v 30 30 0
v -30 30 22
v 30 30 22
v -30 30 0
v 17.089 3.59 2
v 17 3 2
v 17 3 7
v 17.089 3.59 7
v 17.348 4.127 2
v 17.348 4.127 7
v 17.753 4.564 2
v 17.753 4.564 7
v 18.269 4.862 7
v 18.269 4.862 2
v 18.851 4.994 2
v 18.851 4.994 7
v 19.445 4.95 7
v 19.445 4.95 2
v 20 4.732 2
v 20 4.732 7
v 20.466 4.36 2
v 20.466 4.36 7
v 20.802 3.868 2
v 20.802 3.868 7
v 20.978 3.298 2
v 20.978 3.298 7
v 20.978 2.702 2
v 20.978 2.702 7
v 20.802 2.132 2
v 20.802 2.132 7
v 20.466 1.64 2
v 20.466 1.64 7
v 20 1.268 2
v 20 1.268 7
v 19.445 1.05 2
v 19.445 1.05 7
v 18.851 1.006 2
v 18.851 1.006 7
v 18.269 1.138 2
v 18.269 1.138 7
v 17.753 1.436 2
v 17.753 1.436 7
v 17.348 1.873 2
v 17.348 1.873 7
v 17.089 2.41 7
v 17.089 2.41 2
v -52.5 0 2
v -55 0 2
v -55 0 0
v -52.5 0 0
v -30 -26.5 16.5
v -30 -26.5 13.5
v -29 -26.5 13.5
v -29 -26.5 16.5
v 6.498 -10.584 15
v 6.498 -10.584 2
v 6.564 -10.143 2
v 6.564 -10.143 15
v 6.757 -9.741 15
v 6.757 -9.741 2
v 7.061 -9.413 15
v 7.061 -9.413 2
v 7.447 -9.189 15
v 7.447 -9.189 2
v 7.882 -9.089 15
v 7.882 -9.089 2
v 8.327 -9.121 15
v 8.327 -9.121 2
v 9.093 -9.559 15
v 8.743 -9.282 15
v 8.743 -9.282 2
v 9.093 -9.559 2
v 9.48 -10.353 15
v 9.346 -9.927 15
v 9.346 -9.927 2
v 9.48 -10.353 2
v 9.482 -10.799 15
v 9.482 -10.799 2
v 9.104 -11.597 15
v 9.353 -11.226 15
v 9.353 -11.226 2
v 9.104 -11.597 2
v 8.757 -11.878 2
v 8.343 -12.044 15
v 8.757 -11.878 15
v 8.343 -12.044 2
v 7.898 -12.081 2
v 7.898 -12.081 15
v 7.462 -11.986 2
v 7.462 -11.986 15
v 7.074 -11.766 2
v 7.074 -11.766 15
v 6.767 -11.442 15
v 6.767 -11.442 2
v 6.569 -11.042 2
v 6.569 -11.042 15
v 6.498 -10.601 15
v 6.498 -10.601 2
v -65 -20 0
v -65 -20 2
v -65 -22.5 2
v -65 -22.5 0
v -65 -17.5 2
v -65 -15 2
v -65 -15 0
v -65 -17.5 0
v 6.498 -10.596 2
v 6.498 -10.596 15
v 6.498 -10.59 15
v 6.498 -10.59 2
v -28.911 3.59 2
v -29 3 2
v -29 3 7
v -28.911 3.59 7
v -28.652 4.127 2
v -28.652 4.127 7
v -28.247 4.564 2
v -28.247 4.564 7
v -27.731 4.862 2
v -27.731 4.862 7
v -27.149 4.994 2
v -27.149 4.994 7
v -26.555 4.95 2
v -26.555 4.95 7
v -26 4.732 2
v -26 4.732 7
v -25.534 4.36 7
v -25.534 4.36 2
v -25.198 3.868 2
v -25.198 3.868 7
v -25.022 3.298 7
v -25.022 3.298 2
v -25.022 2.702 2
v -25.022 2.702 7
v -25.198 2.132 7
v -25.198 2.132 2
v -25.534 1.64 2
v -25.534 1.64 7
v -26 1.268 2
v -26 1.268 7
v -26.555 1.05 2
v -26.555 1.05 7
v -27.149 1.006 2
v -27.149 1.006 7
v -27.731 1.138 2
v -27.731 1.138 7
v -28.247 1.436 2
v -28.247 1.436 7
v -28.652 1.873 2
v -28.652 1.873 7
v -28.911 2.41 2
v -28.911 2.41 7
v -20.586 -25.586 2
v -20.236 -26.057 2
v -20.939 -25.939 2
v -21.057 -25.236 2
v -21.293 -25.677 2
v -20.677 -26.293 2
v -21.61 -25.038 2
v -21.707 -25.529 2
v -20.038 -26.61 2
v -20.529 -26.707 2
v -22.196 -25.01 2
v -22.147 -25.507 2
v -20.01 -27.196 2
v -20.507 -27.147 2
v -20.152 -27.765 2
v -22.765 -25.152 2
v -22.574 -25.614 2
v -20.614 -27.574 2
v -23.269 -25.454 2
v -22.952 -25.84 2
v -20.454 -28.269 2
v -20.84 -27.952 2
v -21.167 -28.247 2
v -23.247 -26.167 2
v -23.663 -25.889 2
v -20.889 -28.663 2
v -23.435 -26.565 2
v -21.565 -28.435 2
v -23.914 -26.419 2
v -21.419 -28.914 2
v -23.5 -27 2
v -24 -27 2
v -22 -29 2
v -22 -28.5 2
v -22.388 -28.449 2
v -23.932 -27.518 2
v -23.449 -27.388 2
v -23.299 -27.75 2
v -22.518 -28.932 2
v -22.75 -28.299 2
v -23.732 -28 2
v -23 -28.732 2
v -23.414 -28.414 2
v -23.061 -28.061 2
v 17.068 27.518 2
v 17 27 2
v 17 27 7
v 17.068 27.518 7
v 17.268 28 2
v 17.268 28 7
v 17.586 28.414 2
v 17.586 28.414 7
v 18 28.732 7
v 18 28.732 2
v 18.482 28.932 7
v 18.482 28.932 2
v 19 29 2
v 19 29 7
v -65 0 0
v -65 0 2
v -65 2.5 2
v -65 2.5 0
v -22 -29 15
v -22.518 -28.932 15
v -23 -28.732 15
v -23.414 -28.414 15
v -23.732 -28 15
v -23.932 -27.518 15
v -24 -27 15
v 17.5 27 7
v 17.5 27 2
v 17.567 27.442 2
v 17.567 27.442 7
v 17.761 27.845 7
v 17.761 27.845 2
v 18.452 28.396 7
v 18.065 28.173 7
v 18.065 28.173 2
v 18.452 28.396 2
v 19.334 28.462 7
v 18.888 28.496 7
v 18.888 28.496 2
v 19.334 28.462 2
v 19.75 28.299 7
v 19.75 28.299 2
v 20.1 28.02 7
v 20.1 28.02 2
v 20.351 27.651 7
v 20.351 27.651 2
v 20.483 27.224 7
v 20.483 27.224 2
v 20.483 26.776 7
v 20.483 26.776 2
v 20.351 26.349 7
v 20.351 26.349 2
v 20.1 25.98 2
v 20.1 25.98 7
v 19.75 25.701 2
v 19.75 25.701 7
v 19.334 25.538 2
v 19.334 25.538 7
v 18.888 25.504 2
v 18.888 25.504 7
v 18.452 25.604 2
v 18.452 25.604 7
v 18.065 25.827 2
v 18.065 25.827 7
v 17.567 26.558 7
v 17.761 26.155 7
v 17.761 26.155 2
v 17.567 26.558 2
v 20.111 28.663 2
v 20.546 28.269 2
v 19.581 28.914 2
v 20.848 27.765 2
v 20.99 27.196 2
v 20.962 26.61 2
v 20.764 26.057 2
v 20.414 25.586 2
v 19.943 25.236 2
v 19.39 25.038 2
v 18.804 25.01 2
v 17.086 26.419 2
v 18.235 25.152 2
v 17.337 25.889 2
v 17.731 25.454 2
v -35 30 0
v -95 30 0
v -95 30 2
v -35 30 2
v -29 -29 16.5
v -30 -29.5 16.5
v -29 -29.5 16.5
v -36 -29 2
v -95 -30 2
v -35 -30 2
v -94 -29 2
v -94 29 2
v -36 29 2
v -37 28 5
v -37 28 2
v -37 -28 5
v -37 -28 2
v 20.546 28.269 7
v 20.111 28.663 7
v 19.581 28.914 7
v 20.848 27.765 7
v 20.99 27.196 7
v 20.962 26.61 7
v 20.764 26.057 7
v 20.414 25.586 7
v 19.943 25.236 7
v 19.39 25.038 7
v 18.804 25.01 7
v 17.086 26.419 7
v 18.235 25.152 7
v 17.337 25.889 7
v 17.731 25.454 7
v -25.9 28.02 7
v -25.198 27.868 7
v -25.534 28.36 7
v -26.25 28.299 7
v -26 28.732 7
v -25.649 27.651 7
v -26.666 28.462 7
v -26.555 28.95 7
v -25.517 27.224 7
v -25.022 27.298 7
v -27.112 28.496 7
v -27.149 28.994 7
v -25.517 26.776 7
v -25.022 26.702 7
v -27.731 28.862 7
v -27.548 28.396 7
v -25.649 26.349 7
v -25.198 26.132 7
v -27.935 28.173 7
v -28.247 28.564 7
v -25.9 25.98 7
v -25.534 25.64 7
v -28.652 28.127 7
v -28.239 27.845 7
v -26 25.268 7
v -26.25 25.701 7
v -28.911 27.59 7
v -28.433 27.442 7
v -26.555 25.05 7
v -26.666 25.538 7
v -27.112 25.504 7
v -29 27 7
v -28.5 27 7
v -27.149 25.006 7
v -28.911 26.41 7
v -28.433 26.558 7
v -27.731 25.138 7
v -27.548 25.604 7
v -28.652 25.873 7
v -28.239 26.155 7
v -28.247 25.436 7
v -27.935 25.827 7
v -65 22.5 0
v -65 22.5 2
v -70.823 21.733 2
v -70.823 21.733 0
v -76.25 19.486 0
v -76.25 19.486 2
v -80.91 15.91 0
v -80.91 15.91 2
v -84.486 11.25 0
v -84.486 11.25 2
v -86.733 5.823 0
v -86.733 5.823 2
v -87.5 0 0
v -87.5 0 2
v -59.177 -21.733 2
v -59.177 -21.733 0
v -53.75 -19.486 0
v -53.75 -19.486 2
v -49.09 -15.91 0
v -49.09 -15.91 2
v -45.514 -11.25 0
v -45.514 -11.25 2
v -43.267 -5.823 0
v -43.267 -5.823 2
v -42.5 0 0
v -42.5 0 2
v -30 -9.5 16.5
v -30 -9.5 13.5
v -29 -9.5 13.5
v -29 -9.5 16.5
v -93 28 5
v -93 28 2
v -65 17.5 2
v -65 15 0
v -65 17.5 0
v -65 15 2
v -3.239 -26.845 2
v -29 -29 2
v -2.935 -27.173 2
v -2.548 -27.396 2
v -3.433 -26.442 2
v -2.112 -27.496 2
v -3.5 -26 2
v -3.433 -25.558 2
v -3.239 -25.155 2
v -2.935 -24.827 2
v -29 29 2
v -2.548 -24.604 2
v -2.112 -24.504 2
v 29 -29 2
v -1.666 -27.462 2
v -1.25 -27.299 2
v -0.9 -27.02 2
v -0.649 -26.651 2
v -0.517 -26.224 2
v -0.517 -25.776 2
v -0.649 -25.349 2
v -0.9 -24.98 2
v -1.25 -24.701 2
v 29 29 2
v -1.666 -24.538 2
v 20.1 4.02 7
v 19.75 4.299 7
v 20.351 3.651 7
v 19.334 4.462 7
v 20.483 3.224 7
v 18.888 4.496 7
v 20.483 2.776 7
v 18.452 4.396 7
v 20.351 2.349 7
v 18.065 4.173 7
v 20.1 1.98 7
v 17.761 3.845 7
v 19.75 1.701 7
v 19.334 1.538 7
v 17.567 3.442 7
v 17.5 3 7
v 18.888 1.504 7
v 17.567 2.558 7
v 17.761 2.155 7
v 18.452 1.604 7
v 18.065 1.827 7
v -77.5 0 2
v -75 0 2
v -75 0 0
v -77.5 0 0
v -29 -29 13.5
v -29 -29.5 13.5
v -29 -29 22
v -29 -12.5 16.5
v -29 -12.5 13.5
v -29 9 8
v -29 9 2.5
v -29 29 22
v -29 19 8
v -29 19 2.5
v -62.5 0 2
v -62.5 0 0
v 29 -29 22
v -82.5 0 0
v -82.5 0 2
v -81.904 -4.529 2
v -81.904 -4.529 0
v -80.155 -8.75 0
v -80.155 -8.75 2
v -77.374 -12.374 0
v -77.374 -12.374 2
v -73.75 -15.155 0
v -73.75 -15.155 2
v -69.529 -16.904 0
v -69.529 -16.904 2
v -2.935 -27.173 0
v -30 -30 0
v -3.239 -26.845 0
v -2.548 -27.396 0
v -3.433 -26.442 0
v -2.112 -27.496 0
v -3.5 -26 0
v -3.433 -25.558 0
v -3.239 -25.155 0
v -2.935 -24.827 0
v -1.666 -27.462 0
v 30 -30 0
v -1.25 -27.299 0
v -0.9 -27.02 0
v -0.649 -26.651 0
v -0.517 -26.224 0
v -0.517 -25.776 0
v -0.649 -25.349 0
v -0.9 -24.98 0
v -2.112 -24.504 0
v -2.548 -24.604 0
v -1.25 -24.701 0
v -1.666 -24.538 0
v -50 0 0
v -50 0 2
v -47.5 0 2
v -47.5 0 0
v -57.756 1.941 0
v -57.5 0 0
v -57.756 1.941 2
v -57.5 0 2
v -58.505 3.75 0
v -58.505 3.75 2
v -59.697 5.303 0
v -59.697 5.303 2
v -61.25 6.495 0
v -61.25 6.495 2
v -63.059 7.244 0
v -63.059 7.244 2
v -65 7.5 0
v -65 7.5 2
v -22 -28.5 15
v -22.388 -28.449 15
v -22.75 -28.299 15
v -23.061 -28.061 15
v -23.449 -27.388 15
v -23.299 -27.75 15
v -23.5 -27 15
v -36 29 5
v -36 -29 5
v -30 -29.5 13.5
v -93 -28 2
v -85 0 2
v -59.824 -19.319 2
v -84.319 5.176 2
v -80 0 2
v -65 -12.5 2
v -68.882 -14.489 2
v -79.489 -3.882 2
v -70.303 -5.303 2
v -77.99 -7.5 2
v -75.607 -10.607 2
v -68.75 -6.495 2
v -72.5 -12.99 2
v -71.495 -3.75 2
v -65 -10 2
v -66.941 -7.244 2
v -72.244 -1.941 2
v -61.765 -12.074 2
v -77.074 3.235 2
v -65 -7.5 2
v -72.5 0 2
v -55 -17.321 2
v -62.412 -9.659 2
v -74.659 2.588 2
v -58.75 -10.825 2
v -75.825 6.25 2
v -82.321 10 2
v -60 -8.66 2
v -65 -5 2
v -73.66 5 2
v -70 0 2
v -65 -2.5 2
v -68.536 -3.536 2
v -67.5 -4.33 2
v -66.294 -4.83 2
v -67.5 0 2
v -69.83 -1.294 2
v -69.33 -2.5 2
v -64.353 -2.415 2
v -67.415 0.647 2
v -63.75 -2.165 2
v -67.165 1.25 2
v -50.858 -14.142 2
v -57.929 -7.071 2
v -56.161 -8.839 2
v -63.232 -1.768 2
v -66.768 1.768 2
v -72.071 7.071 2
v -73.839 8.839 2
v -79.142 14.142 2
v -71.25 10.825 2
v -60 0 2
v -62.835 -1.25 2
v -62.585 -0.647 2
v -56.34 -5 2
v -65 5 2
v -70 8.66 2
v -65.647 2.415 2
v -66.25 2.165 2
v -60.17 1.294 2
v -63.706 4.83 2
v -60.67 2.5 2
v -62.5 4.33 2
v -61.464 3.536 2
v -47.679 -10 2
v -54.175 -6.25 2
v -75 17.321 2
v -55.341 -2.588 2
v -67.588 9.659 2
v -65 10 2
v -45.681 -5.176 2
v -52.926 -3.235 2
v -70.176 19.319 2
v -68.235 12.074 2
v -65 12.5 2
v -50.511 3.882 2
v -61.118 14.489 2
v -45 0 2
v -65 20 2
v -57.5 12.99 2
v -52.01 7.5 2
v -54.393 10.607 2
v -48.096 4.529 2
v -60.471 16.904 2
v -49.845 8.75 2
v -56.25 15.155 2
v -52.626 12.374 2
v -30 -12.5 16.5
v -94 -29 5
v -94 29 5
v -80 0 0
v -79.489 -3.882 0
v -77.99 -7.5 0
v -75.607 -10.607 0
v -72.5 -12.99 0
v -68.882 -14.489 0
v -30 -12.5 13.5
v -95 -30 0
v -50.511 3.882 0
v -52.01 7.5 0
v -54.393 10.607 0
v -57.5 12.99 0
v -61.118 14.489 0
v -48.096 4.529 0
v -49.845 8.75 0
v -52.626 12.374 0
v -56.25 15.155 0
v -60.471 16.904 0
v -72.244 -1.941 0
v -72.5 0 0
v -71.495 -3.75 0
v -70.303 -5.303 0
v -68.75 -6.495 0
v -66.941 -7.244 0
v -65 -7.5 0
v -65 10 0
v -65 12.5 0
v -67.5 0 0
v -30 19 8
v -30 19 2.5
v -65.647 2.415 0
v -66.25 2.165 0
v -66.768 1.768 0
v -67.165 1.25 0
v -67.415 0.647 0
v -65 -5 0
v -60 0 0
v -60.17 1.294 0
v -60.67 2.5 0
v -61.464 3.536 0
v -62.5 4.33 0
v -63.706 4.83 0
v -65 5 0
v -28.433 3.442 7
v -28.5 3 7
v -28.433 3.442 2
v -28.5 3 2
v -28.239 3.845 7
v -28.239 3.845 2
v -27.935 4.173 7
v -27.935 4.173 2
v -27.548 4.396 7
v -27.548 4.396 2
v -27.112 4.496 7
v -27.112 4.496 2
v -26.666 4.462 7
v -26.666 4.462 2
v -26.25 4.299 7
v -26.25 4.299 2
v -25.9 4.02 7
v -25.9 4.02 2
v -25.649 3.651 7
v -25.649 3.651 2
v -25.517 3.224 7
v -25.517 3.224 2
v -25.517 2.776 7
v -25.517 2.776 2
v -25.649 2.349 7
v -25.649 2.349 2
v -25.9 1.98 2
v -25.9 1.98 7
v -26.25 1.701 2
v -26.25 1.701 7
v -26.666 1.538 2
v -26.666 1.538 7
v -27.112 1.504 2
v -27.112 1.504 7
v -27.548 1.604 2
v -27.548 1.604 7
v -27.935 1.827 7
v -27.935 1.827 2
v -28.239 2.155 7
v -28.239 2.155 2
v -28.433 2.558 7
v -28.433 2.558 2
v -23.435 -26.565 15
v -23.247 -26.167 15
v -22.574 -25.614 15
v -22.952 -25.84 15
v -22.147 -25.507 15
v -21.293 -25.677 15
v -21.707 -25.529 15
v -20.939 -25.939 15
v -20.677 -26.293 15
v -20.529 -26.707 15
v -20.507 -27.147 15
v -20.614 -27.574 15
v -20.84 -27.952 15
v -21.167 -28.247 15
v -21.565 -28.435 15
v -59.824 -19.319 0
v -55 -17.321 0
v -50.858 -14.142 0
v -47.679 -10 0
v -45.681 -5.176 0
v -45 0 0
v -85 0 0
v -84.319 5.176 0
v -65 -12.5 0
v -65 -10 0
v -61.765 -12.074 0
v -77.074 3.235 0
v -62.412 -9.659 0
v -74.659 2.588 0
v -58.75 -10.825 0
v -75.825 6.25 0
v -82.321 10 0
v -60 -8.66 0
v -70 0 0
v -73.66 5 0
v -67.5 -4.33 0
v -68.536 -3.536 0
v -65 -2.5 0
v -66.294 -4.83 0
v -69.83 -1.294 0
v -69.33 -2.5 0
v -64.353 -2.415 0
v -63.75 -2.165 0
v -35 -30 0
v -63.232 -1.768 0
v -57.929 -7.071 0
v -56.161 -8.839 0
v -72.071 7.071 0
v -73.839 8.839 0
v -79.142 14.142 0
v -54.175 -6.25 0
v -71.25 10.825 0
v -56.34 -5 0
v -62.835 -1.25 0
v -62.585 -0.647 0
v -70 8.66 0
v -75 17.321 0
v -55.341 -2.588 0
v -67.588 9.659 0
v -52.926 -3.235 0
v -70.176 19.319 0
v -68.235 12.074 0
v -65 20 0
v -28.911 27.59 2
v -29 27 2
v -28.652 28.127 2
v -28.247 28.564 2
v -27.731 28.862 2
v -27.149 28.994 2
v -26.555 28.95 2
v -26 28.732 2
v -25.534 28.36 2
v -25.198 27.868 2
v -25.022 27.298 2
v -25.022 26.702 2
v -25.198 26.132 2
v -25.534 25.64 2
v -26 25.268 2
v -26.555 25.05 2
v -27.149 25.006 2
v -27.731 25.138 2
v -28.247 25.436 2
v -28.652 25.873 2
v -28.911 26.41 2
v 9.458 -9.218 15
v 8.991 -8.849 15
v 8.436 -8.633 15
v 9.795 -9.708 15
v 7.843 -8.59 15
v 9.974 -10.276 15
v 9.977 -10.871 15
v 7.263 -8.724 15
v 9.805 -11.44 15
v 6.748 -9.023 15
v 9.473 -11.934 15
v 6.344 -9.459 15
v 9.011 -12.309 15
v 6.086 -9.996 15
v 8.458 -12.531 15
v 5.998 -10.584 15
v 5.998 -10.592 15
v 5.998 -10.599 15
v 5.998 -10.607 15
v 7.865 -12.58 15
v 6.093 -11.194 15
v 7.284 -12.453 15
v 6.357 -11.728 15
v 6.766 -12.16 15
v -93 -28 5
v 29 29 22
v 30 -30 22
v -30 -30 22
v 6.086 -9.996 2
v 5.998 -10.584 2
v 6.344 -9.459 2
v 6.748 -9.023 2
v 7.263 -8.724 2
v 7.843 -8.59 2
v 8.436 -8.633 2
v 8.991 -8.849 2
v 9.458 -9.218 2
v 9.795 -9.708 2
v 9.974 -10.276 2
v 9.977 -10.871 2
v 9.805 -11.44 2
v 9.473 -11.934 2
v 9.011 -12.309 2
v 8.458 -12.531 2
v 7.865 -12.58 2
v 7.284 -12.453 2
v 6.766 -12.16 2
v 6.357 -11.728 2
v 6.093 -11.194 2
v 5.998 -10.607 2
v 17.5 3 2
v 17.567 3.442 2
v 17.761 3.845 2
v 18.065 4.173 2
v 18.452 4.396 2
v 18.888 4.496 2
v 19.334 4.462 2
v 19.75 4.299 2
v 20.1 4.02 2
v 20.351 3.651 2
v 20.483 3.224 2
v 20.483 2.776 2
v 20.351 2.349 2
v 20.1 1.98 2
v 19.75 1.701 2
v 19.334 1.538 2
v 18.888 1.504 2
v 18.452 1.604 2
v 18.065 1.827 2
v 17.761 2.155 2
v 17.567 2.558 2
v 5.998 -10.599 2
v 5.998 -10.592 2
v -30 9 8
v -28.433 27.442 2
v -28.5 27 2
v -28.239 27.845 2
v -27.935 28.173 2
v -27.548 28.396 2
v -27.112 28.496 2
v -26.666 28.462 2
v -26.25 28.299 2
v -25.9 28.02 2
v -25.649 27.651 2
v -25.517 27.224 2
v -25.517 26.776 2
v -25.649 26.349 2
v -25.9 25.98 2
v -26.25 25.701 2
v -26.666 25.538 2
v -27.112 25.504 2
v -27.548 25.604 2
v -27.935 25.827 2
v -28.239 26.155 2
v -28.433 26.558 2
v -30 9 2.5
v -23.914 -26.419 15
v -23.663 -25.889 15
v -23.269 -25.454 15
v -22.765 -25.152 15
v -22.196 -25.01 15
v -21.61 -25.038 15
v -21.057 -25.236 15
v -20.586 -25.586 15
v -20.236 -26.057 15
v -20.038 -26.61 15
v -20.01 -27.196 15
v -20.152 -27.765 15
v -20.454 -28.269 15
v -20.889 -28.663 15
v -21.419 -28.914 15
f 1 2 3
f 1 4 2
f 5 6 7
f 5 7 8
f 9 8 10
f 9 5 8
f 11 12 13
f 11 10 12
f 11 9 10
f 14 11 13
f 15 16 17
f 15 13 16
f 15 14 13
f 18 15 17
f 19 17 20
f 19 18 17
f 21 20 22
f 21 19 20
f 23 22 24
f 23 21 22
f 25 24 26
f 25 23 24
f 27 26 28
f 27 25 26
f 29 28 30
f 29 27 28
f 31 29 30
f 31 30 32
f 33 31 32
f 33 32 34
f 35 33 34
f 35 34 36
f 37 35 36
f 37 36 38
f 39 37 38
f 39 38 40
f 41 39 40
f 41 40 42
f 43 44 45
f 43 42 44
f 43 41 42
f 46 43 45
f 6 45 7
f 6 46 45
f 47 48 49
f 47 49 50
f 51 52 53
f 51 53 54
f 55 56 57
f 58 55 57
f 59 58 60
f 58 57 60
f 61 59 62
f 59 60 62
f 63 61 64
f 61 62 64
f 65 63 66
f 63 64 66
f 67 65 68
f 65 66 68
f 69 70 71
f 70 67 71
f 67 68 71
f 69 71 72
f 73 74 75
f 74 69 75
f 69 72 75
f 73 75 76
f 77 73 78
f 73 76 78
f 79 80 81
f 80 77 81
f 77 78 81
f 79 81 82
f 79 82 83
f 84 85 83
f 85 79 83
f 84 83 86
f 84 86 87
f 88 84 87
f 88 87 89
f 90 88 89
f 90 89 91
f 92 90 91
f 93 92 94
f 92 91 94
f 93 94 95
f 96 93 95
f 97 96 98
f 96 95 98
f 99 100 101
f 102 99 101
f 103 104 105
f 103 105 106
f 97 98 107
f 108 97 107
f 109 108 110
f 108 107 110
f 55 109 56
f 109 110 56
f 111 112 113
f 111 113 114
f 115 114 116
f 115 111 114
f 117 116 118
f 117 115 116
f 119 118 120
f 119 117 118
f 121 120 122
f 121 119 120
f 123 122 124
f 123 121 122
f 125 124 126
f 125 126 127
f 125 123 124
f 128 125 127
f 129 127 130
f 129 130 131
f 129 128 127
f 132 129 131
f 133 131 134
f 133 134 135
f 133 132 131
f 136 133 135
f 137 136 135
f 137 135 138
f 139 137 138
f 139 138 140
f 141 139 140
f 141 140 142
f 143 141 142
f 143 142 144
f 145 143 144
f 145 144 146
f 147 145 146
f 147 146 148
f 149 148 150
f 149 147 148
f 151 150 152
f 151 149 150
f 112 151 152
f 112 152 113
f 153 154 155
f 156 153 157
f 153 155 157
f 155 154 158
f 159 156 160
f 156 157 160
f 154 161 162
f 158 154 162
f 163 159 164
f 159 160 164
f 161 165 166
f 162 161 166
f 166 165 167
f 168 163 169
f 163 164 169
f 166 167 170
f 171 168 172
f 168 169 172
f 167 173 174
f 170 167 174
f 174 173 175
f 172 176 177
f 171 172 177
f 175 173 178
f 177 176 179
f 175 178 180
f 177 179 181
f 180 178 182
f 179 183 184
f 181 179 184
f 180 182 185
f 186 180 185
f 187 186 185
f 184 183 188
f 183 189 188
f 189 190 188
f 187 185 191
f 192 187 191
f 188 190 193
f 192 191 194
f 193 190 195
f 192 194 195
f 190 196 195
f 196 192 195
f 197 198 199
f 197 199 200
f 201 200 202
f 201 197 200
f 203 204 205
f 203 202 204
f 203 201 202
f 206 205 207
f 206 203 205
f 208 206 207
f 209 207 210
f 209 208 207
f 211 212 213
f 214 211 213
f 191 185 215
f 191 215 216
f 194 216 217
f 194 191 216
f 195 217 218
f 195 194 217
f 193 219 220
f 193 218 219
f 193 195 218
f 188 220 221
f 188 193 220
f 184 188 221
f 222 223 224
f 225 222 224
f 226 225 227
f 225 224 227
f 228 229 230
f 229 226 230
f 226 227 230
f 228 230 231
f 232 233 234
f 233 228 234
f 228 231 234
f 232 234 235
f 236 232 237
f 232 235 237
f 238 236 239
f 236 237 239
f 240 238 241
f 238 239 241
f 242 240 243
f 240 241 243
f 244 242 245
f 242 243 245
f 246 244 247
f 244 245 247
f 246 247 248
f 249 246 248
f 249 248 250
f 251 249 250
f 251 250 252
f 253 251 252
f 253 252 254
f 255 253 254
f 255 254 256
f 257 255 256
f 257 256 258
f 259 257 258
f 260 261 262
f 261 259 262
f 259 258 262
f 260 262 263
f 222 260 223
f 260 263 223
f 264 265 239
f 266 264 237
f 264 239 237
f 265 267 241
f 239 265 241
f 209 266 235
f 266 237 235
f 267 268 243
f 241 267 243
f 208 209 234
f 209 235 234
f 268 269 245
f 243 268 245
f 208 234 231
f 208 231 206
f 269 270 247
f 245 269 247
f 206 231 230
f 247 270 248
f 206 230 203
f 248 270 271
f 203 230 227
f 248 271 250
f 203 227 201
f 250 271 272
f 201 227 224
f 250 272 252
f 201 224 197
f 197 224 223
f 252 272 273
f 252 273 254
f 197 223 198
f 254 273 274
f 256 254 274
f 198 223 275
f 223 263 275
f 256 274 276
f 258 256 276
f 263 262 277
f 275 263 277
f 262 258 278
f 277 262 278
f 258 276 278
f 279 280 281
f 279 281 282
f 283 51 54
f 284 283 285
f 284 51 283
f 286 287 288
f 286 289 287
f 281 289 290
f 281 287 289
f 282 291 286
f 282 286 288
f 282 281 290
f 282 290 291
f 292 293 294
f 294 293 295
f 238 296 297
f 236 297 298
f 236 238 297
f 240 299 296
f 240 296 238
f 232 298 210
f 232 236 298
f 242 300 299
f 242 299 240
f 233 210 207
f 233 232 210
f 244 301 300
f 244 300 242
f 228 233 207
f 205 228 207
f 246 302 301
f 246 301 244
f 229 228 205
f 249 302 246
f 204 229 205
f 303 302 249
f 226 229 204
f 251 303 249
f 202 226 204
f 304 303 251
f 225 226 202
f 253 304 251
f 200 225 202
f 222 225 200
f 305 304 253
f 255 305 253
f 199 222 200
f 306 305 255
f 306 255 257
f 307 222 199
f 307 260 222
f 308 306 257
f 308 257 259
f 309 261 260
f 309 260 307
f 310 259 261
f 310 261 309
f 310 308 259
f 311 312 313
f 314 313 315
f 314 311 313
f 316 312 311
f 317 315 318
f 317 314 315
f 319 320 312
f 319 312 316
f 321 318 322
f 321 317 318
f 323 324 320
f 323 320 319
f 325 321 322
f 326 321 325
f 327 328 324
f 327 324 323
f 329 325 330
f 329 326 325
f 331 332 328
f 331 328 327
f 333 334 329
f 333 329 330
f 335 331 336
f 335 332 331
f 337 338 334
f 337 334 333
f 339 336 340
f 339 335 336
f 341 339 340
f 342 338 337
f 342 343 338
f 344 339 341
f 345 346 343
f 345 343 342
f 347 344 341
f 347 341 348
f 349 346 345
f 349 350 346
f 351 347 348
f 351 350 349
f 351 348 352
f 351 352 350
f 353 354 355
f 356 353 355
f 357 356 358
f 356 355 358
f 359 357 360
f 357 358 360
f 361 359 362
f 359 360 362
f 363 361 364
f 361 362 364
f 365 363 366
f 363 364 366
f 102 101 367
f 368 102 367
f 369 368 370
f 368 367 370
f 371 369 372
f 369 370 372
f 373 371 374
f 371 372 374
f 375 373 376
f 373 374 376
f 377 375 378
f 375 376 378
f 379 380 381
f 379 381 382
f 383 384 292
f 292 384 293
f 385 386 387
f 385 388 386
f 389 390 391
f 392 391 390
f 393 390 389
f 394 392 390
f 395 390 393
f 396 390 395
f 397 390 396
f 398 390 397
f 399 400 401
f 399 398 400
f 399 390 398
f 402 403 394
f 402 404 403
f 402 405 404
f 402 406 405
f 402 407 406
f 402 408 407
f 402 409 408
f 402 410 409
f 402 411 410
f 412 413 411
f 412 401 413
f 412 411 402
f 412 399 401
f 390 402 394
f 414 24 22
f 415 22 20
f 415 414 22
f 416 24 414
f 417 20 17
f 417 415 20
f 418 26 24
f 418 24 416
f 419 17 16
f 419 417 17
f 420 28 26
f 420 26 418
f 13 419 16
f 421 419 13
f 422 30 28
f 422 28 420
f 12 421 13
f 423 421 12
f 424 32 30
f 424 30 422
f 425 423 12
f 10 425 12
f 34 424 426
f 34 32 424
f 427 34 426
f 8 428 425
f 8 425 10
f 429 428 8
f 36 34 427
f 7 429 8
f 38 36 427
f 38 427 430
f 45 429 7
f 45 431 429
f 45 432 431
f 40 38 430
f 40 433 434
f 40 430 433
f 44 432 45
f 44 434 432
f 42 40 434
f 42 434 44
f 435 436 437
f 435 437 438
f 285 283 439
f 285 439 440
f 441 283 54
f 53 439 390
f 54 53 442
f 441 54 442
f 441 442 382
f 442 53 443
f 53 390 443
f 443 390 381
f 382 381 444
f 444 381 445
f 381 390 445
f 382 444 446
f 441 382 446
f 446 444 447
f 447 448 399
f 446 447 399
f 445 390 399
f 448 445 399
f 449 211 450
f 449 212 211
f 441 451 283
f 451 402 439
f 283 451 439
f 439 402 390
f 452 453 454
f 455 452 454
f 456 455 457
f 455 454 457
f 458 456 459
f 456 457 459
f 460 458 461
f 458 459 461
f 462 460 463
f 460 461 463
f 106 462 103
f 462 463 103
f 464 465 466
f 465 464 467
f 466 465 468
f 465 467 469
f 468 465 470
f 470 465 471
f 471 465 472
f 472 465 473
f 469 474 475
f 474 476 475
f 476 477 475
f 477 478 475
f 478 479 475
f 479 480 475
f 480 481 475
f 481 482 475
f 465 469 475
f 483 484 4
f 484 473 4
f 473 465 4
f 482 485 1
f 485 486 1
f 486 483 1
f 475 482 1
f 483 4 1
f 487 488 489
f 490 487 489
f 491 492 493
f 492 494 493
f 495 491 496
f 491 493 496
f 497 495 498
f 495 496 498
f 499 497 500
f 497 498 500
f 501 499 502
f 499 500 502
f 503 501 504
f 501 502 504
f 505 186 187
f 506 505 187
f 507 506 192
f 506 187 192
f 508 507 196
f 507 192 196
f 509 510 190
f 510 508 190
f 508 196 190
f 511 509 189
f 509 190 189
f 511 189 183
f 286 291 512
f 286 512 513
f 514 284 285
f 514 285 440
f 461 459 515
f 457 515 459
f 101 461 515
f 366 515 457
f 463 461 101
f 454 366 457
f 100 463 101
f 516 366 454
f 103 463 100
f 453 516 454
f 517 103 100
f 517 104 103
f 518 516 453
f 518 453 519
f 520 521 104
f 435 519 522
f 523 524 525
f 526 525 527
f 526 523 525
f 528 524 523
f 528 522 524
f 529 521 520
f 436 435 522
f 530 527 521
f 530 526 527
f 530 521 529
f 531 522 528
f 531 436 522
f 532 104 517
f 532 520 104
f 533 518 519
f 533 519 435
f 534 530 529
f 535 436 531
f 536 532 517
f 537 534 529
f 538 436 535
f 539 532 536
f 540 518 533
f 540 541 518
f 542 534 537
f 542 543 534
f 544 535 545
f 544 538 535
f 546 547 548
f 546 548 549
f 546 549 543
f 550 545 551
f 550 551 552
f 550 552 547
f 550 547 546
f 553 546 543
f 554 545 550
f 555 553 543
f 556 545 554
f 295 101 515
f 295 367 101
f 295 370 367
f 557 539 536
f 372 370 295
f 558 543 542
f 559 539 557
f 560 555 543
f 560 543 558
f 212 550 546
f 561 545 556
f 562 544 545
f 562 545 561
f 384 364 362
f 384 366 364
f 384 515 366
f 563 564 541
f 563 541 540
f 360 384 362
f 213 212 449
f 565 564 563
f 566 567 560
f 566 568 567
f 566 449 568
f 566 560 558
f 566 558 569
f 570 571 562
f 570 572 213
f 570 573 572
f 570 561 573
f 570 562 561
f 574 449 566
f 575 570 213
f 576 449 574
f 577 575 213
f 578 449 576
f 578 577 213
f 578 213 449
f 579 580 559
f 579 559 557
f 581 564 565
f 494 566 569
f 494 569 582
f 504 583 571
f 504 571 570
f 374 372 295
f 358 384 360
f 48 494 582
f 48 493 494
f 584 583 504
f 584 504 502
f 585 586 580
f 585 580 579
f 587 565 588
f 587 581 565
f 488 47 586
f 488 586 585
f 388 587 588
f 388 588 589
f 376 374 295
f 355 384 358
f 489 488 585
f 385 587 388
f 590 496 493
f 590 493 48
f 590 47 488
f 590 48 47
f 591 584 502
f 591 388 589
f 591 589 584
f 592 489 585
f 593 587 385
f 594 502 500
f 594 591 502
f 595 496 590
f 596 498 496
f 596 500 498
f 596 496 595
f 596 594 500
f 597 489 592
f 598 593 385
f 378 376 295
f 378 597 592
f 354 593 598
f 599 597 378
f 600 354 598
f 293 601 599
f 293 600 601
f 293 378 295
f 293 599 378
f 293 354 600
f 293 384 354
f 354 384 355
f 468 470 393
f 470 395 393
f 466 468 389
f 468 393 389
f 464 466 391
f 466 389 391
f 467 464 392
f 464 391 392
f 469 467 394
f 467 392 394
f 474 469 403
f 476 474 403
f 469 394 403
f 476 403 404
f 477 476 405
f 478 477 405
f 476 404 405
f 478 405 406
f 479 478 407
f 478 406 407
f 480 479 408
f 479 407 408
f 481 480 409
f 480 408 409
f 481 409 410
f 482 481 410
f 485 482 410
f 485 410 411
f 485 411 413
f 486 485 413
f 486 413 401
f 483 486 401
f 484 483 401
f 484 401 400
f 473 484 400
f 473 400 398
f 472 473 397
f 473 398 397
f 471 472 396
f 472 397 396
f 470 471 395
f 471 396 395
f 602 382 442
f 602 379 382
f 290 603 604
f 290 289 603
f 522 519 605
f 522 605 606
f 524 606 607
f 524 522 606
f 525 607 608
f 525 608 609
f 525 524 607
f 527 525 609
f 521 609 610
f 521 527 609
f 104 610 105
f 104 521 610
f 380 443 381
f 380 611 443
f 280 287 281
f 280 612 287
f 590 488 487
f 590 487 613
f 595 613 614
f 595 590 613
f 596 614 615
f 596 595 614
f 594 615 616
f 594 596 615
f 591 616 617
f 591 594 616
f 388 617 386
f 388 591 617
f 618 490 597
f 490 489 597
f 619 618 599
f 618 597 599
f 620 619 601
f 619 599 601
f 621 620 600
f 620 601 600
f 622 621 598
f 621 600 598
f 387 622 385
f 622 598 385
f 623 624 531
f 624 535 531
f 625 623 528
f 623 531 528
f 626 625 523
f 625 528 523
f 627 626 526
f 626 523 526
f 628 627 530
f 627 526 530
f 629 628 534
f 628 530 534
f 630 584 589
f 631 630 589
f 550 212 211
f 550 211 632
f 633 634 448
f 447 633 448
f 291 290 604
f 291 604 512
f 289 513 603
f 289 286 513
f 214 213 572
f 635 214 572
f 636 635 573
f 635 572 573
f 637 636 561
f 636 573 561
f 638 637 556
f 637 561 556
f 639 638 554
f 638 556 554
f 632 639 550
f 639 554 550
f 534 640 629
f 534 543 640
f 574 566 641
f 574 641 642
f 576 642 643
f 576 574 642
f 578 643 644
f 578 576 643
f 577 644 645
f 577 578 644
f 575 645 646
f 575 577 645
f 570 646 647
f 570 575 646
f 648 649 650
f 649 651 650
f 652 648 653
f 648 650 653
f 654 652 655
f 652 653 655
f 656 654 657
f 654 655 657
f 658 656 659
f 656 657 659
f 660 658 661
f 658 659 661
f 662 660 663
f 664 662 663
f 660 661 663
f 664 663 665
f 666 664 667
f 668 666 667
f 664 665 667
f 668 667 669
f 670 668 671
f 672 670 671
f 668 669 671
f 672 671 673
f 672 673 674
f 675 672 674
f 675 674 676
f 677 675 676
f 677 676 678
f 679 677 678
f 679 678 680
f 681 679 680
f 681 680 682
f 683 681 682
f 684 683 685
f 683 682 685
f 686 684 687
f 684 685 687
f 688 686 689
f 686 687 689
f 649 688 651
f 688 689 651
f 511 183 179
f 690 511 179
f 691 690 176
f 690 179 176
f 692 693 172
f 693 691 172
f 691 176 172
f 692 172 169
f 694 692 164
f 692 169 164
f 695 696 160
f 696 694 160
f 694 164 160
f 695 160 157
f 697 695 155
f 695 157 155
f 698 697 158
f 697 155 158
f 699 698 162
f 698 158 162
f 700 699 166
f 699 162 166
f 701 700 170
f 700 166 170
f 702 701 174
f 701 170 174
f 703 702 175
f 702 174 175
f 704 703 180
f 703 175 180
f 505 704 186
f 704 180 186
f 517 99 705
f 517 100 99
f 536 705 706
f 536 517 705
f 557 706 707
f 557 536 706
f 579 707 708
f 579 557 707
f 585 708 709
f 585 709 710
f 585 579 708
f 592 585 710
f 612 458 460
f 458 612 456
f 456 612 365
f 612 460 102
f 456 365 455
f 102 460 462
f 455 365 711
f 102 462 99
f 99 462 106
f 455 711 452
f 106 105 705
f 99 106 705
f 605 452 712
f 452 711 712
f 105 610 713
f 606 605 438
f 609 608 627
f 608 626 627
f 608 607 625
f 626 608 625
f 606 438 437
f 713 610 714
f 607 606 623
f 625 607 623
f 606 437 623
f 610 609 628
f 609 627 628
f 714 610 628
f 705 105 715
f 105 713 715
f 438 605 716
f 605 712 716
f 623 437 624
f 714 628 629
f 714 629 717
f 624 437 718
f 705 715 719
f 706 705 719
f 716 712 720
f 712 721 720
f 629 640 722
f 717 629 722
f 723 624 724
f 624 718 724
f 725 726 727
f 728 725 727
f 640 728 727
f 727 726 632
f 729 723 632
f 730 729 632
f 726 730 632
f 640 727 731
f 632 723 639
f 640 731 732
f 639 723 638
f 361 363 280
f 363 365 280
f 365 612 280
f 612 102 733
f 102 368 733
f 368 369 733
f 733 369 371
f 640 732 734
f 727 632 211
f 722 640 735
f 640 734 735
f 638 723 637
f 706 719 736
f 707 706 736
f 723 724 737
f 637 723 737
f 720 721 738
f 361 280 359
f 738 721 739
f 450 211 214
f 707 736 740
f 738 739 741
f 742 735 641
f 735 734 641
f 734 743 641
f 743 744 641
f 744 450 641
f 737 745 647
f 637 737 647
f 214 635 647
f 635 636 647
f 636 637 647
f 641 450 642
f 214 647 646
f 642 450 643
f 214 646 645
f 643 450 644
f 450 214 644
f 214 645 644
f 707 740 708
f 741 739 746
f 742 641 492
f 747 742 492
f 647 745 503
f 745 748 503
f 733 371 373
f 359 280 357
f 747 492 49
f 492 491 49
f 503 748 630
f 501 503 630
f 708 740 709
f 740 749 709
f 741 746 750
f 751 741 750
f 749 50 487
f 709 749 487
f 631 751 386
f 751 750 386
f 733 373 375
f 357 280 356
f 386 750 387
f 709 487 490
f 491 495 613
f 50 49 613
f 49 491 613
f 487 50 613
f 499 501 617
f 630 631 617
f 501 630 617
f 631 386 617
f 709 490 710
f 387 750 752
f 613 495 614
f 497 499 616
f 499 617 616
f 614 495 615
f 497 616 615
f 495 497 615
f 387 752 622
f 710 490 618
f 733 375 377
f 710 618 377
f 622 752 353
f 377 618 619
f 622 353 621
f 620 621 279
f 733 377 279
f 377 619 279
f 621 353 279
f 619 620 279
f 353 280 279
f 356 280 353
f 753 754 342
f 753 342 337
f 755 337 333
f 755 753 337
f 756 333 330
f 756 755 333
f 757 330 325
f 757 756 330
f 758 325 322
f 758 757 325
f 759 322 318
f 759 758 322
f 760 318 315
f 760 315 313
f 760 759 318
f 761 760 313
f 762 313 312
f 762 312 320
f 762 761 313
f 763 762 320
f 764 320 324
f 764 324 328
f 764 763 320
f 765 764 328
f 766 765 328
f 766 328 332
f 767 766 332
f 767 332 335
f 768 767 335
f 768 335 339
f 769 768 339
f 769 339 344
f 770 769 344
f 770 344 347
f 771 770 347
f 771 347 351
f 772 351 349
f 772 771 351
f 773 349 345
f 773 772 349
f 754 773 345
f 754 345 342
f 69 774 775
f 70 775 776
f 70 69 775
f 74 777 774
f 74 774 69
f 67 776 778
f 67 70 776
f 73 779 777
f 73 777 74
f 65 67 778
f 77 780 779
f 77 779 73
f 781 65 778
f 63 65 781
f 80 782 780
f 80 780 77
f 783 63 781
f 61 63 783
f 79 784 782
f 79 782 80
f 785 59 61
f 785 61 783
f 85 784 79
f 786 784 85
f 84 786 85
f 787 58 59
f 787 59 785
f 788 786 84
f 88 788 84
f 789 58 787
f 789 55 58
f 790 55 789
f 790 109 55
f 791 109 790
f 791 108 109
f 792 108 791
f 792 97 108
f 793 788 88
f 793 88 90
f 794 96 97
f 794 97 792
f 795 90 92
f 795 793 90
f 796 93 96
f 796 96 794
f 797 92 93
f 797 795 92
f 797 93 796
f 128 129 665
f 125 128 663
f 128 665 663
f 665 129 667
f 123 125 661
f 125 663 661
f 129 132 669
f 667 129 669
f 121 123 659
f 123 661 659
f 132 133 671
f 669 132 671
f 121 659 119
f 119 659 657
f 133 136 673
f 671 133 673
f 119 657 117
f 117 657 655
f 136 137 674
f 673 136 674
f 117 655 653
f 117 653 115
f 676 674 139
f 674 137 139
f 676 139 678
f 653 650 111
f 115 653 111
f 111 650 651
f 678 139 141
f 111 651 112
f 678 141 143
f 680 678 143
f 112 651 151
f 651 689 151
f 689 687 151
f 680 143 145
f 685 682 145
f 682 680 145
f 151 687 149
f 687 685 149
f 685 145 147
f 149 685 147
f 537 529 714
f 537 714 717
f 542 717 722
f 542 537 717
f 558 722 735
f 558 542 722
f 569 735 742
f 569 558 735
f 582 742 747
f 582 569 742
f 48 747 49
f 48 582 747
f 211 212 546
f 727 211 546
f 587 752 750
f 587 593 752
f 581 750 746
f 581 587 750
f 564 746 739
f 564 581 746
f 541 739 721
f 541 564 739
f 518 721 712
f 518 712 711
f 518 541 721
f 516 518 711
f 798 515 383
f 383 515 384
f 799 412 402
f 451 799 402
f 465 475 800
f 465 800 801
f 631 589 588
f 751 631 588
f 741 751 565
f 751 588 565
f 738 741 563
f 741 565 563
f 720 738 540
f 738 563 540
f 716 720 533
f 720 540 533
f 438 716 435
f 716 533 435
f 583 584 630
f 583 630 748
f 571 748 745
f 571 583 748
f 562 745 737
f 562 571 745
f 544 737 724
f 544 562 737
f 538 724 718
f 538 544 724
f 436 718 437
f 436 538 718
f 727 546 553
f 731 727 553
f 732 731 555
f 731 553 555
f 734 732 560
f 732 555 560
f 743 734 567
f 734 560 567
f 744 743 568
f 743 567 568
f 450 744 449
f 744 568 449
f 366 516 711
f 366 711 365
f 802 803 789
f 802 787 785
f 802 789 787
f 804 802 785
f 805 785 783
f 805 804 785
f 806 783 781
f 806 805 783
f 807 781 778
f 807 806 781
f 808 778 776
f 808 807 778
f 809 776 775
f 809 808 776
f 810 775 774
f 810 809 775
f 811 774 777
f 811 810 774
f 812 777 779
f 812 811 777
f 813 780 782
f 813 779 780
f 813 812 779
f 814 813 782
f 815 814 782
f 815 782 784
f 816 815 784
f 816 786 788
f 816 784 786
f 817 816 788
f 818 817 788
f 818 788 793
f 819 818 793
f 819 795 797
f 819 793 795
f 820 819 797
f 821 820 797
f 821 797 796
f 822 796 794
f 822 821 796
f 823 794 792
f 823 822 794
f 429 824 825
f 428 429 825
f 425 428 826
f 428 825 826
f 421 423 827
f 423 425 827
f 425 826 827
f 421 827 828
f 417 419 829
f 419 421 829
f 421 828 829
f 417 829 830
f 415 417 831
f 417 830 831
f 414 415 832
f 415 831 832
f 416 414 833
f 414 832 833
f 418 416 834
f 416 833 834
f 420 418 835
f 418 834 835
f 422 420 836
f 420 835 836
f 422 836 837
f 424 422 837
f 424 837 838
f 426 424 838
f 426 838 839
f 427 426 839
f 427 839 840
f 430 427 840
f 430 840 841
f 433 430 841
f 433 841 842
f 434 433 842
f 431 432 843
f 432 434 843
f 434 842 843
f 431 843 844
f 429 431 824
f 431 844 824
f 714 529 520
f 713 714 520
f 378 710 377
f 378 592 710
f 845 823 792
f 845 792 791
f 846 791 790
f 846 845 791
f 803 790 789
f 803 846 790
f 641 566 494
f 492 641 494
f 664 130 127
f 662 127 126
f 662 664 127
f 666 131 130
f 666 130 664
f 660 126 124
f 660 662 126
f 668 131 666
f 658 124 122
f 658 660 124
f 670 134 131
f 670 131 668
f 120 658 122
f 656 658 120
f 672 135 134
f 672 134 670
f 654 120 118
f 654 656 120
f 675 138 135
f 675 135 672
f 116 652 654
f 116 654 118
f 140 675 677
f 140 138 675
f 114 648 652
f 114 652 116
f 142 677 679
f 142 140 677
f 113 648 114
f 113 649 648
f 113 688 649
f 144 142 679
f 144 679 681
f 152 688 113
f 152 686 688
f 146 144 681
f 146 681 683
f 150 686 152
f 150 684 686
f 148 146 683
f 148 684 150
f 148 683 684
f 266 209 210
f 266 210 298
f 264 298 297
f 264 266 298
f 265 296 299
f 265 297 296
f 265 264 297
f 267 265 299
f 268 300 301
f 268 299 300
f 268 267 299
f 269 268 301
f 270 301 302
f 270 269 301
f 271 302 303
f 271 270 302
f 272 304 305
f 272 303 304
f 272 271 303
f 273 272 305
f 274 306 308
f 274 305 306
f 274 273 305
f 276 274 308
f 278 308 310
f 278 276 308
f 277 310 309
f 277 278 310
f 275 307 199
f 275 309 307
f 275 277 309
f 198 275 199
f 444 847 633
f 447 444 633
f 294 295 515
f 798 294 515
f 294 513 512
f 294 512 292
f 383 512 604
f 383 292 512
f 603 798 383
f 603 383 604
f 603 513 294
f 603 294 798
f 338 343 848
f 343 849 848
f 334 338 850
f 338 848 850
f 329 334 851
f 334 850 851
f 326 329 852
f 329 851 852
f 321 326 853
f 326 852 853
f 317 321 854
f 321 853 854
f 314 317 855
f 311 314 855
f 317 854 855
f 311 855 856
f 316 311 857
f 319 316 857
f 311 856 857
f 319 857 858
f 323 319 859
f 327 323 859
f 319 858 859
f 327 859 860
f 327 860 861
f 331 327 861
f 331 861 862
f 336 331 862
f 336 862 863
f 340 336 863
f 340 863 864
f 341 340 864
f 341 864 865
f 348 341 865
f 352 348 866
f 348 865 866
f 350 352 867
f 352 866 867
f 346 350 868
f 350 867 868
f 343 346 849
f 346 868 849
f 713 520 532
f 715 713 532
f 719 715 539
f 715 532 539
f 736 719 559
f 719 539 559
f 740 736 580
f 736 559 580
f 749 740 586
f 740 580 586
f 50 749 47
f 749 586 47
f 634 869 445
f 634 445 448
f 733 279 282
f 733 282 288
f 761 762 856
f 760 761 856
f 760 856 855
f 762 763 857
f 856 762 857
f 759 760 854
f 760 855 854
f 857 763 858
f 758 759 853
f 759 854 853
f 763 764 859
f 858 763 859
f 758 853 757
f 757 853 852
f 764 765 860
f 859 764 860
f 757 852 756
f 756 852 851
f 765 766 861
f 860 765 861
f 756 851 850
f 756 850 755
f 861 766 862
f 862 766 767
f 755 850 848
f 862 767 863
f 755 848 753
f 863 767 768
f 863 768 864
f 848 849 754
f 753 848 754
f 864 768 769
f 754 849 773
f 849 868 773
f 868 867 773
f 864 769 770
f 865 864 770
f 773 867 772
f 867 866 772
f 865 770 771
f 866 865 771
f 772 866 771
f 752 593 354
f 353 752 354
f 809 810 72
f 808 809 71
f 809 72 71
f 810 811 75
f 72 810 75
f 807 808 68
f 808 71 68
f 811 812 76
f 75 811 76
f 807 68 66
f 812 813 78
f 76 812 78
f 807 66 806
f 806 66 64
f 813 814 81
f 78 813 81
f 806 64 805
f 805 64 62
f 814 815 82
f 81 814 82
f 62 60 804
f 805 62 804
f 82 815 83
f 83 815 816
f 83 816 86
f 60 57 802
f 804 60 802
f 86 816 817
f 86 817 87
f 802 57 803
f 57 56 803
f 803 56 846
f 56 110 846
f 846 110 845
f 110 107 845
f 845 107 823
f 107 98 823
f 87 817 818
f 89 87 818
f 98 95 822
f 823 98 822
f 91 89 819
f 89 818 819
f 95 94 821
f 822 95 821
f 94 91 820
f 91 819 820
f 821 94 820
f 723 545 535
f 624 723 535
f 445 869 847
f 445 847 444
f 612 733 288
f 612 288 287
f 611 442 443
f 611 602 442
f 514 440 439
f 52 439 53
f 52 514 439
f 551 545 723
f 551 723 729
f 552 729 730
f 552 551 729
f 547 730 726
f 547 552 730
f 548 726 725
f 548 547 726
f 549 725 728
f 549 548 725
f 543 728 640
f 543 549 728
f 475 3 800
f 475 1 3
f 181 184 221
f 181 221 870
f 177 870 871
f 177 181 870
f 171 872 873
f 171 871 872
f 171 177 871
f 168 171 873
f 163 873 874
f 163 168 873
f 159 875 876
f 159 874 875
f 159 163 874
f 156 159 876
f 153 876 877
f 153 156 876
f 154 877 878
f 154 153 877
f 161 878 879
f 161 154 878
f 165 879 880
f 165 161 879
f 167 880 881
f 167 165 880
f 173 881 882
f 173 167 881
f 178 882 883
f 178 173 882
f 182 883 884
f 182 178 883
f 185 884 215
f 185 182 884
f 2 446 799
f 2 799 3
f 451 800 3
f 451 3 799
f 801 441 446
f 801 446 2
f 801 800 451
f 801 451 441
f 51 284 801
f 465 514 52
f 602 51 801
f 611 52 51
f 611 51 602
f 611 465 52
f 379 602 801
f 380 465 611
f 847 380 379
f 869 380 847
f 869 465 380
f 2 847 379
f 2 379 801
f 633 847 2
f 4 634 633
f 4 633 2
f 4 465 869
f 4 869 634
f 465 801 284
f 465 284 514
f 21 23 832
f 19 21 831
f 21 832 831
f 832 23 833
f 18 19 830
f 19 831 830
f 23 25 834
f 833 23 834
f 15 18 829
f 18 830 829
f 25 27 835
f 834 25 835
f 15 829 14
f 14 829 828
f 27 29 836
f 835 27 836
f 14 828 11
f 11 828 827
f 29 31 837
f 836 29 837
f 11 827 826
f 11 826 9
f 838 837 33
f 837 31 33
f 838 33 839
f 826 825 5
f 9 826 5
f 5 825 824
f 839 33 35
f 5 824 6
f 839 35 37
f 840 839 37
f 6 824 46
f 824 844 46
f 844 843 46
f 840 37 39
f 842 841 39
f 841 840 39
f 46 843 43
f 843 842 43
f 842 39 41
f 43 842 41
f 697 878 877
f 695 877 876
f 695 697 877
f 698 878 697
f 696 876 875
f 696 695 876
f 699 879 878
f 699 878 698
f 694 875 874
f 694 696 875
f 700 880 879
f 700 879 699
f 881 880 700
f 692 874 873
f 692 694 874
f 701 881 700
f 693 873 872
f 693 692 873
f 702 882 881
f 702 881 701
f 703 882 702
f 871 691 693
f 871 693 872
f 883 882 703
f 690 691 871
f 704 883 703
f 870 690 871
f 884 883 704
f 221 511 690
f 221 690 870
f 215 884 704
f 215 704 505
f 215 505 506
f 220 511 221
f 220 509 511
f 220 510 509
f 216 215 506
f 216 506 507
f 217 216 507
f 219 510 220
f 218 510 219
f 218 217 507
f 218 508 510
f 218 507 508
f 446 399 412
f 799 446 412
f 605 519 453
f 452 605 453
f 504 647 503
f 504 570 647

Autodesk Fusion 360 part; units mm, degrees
sketch "Sketch1" plane through (0, 0, 0) normal (0, 0, 1) x (1, 0, 0)
  line L0 (30, -30) -> (-30, -30)
  line L1 (-30, -30) -> (-30, 30)
  line L2 (-30, 30) -> (30, 30)
  line L3 (30, 30) -> (30, -30)
  line L4 (30, -30) -> (-30, 30) construction
  line L5 (-30, -30) -> (30, 30) construction
  dimension "d1" = 60
  dimension "d2" = 60
extrude "Extrude1" add sketch "Sketch1" along normal blind 2 makes body 1
sketch "Sketch2" plane through (0, 0, 2) normal (0, 0, 1) x (-1, 0, 0)
  line L0 (-30, -30) -> (30, -30)
  line L1 (30, -30) -> (30, 30)
  line L2 (30, 30) -> (-30, 30)
  line L3 (-30, 30) -> (-30, -30)
  line L4 (30, -30) -> (-30, -30)
  line L5 (-30, -30) -> (-30, 30)
  line L6 (-30, 30) -> (30, 30)
  line L7 (30, 30) -> (30, -30)
  line L8 (29, -29) -> (-29, -29)
  line L9 (-29, -29) -> (-29, 29)
  line L10 (-29, 29) -> (29, 29)
  line L11 (29, 29) -> (29, -29)
extrude "Extrude2" add sketch "Sketch2" along normal blind 20 bodies 1
sketch "Sketch3" plane through (0, 0, 2) normal (0, 0, 1) x (-1, 0, 0)
  line L0 (-29, 29) -> (-29, -29)
  line L1 (-29, -29) -> (29, -29)
  line L2 (29, -29) -> (29, 29)
  line L3 (29, 29) -> (-29, 29)
  circle A0 centre (27, -27) radius 2
  circle A1 centre (27, -27) radius 1.5
  line L4 (27, -27) -> (27, -3)
  circle A2 centre (27, -3) radius 1.5
  circle A3 centre (27, -3) radius 2
  line L5 (27, -27) -> (-19, -27)
  circle A4 centre (-19, -27) radius 1.5
  circle A5 centre (-19, -27) radius 2
  line L6 (27, -3) -> (-19, -3)
  circle A6 centre (-19, -3) radius 1.5
  circle A7 centre (-19, -3) radius 2
  dimension "d7" = 4
  dimension "d8" = 3
  dimension "d9" = 24
  dimension "d10" = 3
  dimension "d11" = 4
  dimension "d12" = 46
  dimension "d13" = 3
  dimension "d14" = 4
  dimension "d15" = 46
  dimension "d16" = 3
  dimension "d17" = 4
extrude "Extrude3" add sketch "Sketch3" along normal blind 5 separate body contours A7 | A5 | L4 A2 A3 L6 | A0 A1 L4 L5 | L4 A2 A3 L6 | A0 A1 L4 L5 makes body 2 at (-28.9901, 3.1991, 3.6667) makes body 3 at (-28.9901, 27.1991, 3.6667) makes body 4 at (17.0025, 3.0997, 5.3333) makes body 5 at (17.0025, 27.0997, 5.3333)
sketch "Sketch4" plane through (-30, 0, 0) normal (-1, 0, 0) x (0, -1, 0)
  line L0 (-30, 0) -> (30, 0)
  line L1 (30, 0) -> (30, 22)
  line L2 (30, 22) -> (-30, 22)
  line L3 (-30, 22) -> (-30, 0)
  line L4 (-30, 0) -> (-14, 0)
  line L5 (-14, 0) -> (-14, 7)
  line L6 (-14, 7) -> (-14, 7.5)
  line L7 (-14, 7.5) -> (-19, 7.5)
  line L8 (-19, 7.5) -> (-9, 7.5)
  line L9 (-9, 7.5) -> (-9, 2.5)
  line L10 (-9, 2.5) -> (-19, 2.5)
  line L11 (-19, 2.5) -> (-19, 7.5)
  dimension "d20" = 16
  dimension "d21" = 7
  dimension "d22" = 0.5
  dimension "d23" = 5
  dimension "d24" = 10
  dimension "d25" = 5
extrude "Extrude4" cut sketch "Sketch4" against normal blind 1 contours L5 L6 L7 L8 L10 L11 | L5 L6 L8 L9 L10 bodies 1
extrude "Extrude5" cut 1 faces at (-29.6667, 12.3333, 7.5) along direction (0, 0, 1) blind 0.5 on bodies 1 bodies 1
sketch "Sketch5" plane through (0, 0, 2) normal (0, 0, 1) x (-1, 0, 0)
  line L0 (-29, 29) -> (-29, -29)
  line L1 (-29, -29) -> (29, -29)
  line L2 (29, -29) -> (29, 29)
  line L3 (29, 29) -> (-29, 29)
  line L4 (22, 29) -> (29, 29)
  line L5 (22, 29) -> (22, 27)
  circle A0 centre (22, 27) radius 2
  circle A1 centre (22, 27) radius 1.5
  line L6 (29, 29) -> (29, 11)
  line L7 (29, 11) -> (-7.9977, 10.5843)
  circle A2 centre (-7.9977, 10.5843) radius 1.5
  circle A3 centre (-7.9977, 10.5843) radius 2
  dimension "d31" = 7
  dimension "d32" = 2
  dimension "d33" = 4
  dimension "d34" = 3
  dimension "d35" = 18
  dimension "d37" = 37
  dimension "d38" = 3
  dimension "d39" = 4
extrude "Extrude6" add sketch "Sketch5" along normal blind 13 separate body contours A3 | A0 makes body 6 at (-23.9901, -26.8009, 6.3333) makes body 7 at (6.0076, -10.3852, 6.3333)
sketch "Sketch6" plane through (0, 0, 2) normal (0, 0, 1) x (-1, 0, 0)
  line L0 (-29, 29) -> (-29, -29)
  line L1 (-29, -29) -> (29, -29)
  line L2 (29, -29) -> (29, 29)
  line L3 (29, 29) -> (-29, 29)
  line L4 (29, 29) -> (2, 29)
  line L5 (2, 29) -> (2, 26)
  circle A0 centre (2, 26) radius 1.5
  dimension "d42" = 27
  dimension "d43" = 3
  dimension "d44" = 3
extrude "Extrude7" cut sketch "Sketch6" against normal blind 5 contours A0 bodies 1
sketch "Sketch7" plane through (-30, 0, 0) normal (-1, 0, 0) x (0, -1, 0)
  line L0 (-9, 8) -> (-9, 2.5)
  line L1 (-9, 2.5) -> (-19, 2.5)
  line L2 (-19, 2.5) -> (-19, 8)
  line L3 (-19, 8) -> (-9, 8)
  line L4 (-30, 0) -> (30, 0)
  line L5 (30, 0) -> (30, 22)
  line L6 (30, 22) -> (-30, 22)
  line L7 (-30, 22) -> (-30, 0)
  line L8 (30, 0) -> (28, 0)
  line L9 (28, 0) -> (28, 15)
  line L10 (29.5, 13.5) -> (26.5, 13.5)
  line L11 (26.5, 13.5) -> (26.5, 16.5)
  line L12 (26.5, 16.5) -> (29.5, 16.5)
  line L13 (29.5, 16.5) -> (29.5, 13.5)
  line L14 (29.5, 13.5) -> (26.5, 16.5) construction
  line L15 (26.5, 13.5) -> (29.5, 16.5) construction
  line L16 (29.5, 15) -> (9.5, 15)
  line L17 (9.5, 15) -> (11, 15)
  line L18 (12.5, 13.5) -> (9.5, 13.5)
  line L19 (9.5, 13.5) -> (9.5, 16.5)
  line L20 (9.5, 16.5) -> (12.5, 16.5)
  line L21 (12.5, 16.5) -> (12.5, 13.5)
  line L22 (12.5, 13.5) -> (9.5, 16.5) construction
  line L23 (9.5, 13.5) -> (12.5, 16.5) construction
  point P0 (28, 15)
  point P1 (11, 15)
  dimension "d47" = 15
  dimension "d48" = 3
  dimension "d49" = 3
  dimension "d50" = 20
  dimension "d51" = 1.5
  dimension "d52" = 3
  dimension "d53" = 3
extrude "Extrude8" cut sketch "Sketch7" against normal blind 1 contours L16 L17 L18 L19 L21 | L16 L17 L19 L20 L21 | L9 L10 L11 L16 | L9 L10 L13 L16 | L11 L12 L13 L16 bodies 1
sketch "Sketch8" plane through (0, 0, 0) normal (0, 0, 1) x (1, 0, 0)
  line L0 (-35, -30) -> (-95, -30)
  line L1 (-95, -30) -> (-95, 30)
  line L2 (-95, 30) -> (-35, 30)
  line L3 (-35, 30) -> (-35, -30)
  dimension "d56" = 60
extrude "Extrude9" add sketch "Sketch8" along normal blind 2 separate body makes body 8
sketch "Sketch9" plane through (0, 0, 2) normal (0, 0, 1) x (-1, 0, 0)
  line L0 (35, -30) -> (95, -30)
  line L1 (95, -30) -> (95, 30)
  line L2 (95, 30) -> (35, 30)
  line L3 (35, 30) -> (35, -30)
  line L4 (35, 30) -> (36, 30)
  line L5 (36, 29) -> (94, 29)
  line L6 (94, 29) -> (94, -29)
  line L7 (94, -29) -> (36, -29)
  line L8 (36, -29) -> (36, 29)
  line L9 (37, 28) -> (93, 28)
  line L10 (93, 28) -> (93, -28)
  line L11 (93, -28) -> (37, -28)
  line L12 (37, -28) -> (37, 28)
  dimension "d59" = 1
extrude "Extrude10" add sketch "Sketch9" along normal blind 3 contours L5 L6 L7 L8 bodies 8
sketch "Sketch10" plane through (0, 0, 2) normal (0, 0, 1) x (-1, 0, 0)
  line L0 (93, -28) -> (93, 28)
  line L1 (93, 28) -> (37, 28)
  line L2 (37, 28) -> (37, -28)
  line L3 (37, -28) -> (93, -28)
  circle A0 centre (65, 0) radius 2.5
  circle A1 centre (65, 0) radius 5
  circle A2 centre (65, 0) radius 7.5
  circle A3 centre (65, 0) radius 10
  circle A4 centre (65, 0) radius 25
  circle A5 centre (65, 0) radius 12.5
  circle A6 centre (65, 0) radius 15
  circle A7 centre (65, 0) radius 17.5
  circle A8 centre (65, 0) radius 20
  circle A9 centre (65, 0) radius 7.5
  circle A10 centre (65, 0) radius 22.5
  line L4 (65, 0) -> (65, -25)
  line L5 (65, 0) -> (90, 0)
  line L6 (65, 0) -> (65, 25)
  line L7 (65, 0) -> (40, 0)
  dimension "d62" = 5
  dimension "d63" = 10
  dimension "d64" = 15
  dimension "d65" = 20
  dimension "d66" = 50
  dimension "d67" = 25
  dimension "d68" = 30
  dimension "d69" = 35
  dimension "d70" = 40
  dimension "d71" = 15
  dimension "d72" = 45
extrude "Extrude11" cut sketch "Sketch10" against normal blind 3 contours A0 L4 L5 | A0 L6 L7 | A1 A2 A9 L5 L6 | A1 A2 A9 L4 L7 | A3 A5 L4 L5 | A3 A5 L6 L7 | A6 A7 L5 L6 | A6 A7 L4 L7 | A8 A10 L4 L5 | A8 A10 L6 L7 bodies 8
